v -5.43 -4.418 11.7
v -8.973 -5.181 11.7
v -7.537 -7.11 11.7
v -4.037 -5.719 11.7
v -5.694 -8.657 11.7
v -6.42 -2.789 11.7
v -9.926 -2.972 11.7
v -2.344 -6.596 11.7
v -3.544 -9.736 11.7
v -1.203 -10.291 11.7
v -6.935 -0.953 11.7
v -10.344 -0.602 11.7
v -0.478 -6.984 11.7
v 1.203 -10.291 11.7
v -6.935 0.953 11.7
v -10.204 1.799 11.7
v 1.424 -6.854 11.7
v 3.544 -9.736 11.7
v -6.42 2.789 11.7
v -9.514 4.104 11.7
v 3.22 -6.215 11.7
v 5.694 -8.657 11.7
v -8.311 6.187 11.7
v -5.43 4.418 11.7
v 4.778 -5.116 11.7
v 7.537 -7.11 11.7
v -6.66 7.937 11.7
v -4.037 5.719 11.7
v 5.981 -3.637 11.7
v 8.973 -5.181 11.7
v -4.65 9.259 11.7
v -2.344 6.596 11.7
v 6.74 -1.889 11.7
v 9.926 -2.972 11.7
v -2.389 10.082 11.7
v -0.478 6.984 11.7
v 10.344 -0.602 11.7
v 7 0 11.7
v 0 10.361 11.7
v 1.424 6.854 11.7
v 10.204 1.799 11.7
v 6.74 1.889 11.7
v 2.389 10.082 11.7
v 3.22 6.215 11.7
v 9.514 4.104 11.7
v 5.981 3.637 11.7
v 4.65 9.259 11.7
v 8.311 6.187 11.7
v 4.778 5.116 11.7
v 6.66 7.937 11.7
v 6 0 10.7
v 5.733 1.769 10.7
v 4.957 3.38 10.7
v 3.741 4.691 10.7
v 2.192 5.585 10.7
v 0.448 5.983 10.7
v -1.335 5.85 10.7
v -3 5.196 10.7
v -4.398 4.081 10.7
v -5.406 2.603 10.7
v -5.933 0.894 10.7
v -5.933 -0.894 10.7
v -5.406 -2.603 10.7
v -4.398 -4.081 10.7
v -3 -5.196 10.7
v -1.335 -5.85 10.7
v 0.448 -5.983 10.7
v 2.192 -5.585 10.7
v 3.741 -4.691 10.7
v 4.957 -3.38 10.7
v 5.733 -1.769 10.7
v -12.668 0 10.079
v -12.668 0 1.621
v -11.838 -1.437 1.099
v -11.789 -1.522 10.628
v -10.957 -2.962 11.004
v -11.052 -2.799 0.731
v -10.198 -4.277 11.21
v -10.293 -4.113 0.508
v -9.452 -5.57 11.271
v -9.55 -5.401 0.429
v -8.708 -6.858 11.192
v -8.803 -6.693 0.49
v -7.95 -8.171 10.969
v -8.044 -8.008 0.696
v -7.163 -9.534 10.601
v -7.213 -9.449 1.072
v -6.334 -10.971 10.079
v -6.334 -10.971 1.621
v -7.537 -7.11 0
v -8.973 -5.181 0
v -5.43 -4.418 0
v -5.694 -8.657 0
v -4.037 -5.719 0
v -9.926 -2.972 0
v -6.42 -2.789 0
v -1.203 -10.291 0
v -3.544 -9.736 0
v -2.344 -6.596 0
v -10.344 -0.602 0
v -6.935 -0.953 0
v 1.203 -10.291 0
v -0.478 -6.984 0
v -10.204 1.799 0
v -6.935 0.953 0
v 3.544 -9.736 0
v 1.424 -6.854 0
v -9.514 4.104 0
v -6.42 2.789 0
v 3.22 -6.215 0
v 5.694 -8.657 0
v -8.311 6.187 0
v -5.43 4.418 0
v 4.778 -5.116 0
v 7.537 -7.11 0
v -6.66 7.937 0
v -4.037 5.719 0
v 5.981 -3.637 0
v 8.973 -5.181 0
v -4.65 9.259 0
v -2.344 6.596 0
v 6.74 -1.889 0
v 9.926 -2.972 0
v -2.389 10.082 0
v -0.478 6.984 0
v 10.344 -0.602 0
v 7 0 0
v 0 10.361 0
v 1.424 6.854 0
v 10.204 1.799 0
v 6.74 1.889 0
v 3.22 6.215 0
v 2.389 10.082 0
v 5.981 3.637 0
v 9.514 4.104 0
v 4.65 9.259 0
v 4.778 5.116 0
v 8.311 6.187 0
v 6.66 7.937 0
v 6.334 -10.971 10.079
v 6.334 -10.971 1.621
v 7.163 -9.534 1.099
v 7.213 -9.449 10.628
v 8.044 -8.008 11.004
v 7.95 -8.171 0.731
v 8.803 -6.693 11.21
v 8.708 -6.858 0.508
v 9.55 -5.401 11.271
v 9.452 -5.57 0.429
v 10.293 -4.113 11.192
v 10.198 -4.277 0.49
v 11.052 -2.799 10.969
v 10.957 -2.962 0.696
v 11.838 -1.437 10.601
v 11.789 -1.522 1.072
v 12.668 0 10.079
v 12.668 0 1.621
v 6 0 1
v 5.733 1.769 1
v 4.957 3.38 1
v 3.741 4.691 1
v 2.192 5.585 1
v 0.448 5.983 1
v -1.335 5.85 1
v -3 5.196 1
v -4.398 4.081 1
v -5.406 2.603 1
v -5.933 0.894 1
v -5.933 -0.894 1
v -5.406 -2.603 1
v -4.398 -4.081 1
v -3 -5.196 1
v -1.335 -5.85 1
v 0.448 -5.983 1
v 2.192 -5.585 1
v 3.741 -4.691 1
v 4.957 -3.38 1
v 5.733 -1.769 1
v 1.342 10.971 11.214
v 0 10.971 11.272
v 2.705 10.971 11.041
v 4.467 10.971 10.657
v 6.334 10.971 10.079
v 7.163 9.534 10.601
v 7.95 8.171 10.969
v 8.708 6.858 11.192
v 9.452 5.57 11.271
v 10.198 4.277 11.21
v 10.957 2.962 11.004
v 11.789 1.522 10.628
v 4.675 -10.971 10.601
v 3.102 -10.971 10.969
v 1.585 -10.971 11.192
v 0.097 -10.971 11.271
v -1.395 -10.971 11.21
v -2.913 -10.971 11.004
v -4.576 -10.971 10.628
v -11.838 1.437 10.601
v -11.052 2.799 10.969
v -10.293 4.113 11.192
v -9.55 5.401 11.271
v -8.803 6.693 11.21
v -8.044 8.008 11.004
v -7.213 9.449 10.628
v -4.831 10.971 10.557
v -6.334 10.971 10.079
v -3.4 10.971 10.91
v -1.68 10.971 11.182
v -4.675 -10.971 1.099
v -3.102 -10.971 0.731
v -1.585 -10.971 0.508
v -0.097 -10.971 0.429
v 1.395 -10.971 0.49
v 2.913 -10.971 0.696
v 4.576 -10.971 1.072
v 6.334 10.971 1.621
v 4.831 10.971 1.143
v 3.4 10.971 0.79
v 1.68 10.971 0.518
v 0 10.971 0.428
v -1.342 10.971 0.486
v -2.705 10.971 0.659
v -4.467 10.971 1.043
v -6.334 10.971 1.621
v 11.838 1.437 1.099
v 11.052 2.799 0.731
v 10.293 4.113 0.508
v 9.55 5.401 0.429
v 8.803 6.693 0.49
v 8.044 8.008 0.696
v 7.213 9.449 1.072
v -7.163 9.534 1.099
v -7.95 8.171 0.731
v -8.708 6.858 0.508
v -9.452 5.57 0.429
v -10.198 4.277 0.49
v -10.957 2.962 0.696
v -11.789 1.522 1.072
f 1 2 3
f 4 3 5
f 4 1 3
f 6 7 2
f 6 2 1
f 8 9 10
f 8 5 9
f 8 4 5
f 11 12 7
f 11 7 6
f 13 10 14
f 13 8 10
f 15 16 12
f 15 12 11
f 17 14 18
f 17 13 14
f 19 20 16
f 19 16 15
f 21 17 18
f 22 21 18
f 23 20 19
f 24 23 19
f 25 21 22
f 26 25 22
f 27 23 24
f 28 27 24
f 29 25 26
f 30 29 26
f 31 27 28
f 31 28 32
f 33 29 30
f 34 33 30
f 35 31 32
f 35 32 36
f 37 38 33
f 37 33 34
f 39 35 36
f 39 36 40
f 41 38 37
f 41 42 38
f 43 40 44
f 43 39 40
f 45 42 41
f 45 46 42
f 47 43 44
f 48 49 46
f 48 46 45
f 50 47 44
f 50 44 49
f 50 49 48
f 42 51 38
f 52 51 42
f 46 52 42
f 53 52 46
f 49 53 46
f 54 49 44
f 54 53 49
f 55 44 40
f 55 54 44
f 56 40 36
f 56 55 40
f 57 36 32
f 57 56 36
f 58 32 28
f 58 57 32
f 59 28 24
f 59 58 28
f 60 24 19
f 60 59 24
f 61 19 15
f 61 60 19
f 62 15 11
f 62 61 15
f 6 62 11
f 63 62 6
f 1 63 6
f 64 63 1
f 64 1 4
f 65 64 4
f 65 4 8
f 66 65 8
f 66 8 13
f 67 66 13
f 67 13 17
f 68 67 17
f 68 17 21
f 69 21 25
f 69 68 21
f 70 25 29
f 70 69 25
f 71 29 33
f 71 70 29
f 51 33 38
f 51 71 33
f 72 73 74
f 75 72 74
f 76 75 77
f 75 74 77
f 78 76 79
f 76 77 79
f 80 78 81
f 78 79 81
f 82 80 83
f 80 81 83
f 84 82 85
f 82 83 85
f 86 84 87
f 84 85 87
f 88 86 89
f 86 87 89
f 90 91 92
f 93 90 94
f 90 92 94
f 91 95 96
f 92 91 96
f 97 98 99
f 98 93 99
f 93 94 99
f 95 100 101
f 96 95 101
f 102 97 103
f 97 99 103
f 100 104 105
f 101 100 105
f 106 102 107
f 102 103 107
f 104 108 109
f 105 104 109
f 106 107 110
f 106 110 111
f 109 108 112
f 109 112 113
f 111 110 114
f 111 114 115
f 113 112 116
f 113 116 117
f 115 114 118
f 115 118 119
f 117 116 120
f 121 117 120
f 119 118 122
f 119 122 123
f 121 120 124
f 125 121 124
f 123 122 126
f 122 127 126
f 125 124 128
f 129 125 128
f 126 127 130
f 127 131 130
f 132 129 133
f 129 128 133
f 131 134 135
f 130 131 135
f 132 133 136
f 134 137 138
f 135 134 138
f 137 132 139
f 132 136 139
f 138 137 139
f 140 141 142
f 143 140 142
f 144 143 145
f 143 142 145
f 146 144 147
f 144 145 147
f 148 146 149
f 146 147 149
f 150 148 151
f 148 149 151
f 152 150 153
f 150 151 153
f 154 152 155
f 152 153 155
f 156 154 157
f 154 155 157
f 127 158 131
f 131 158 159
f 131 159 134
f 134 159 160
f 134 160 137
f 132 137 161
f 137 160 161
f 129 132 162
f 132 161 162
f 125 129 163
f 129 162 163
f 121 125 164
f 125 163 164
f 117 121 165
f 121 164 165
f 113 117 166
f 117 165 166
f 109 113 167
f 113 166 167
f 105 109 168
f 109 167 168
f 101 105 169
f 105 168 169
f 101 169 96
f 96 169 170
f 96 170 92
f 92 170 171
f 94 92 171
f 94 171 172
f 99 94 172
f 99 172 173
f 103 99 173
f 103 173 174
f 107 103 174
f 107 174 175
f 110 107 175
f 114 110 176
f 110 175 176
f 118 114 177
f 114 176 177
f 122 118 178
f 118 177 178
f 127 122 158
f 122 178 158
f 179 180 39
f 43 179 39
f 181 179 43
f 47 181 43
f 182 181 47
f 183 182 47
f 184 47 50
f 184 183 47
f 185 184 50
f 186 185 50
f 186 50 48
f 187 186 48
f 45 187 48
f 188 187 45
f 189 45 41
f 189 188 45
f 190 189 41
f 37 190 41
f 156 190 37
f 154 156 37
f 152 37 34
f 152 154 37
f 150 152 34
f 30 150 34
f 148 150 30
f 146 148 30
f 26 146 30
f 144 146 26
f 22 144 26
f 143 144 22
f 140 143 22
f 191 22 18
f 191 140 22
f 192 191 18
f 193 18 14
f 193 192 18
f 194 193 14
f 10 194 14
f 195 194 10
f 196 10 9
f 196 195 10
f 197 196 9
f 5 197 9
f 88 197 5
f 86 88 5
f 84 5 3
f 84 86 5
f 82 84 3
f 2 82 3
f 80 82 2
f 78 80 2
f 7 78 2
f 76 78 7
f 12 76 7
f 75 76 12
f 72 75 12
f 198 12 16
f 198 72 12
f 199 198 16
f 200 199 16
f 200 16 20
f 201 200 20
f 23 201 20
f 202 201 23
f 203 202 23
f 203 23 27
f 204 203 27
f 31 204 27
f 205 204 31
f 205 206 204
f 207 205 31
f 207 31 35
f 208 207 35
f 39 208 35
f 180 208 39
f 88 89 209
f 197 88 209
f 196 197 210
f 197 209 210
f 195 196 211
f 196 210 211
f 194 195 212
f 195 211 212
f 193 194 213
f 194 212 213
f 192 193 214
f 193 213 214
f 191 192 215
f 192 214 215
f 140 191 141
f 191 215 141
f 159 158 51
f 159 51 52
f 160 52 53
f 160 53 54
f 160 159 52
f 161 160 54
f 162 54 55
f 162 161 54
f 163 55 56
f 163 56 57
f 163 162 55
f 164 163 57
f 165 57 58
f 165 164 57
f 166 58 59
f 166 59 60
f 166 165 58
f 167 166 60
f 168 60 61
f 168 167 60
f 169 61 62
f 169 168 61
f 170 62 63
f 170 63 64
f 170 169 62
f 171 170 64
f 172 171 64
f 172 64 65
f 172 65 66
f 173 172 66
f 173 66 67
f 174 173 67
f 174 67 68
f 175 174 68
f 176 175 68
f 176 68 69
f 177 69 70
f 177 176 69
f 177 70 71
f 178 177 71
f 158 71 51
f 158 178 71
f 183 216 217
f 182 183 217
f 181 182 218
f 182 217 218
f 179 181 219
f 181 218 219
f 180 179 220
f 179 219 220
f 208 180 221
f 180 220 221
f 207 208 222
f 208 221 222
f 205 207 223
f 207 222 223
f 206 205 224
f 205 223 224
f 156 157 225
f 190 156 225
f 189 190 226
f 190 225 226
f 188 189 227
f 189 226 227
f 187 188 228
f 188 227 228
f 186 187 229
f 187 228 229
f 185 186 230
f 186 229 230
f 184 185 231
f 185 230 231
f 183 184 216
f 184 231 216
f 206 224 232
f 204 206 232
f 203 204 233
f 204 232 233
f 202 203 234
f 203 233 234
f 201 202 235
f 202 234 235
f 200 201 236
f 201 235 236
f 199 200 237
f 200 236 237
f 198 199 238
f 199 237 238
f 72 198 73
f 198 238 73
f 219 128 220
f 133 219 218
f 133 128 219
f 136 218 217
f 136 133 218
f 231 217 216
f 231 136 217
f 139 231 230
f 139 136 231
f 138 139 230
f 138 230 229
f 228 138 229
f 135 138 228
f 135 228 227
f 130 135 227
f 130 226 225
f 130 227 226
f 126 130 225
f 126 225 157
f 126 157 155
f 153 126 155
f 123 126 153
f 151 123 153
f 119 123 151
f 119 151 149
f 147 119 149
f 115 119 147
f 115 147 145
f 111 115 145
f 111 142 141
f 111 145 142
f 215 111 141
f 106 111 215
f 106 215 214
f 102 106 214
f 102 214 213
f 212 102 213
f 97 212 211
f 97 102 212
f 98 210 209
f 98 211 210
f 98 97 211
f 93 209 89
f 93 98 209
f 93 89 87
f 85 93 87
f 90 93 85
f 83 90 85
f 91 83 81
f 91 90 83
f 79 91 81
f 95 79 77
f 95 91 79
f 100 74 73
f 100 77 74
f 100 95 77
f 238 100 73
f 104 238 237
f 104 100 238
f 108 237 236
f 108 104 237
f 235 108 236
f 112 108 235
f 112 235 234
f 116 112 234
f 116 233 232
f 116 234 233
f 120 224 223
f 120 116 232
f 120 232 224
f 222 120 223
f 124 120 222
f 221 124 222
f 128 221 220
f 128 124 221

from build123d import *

# Parameters (mm, degrees)
F0_R     = 6
F1_DEPTH = 11.7
F4_SIZE  = 1


with BuildPart() as f1:
    # F0 (on Top) → F1 (new body)
    with BuildSketch(Plane.XY):
        Polygon((6.333883, 10.970607), (-6.333883, 10.970607), (-12.667766, 0), (-6.333883, -10.970607), (6.333883, -10.970607), (12.667766, 0), align=None)
        Circle(F0_R, mode=Mode.SUBTRACT)
    extrude(amount=F1_DEPTH)

    # F2 (on Right) → F3 (revolve, cut)
    with BuildSketch(Plane.YZ):
        Polygon((13.277913, 12.61499), (9.648551, 12.201084), (13.277913, 9.649714), align=None)
        Polygon((13.277913, 2.050286), (9.648551, -0.501084), (13.277913, -0.91499), align=None)
    revolve(axis=Axis((0, 0, 5.981519), (0, 0, -1)), mode=Mode.SUBTRACT)

    # F4
    f4_edges = [f1.edges().sort_by_distance(p)[0] for p in [
        (-6, 0, 11.7),
        (-6, 0, 0),
    ]]
    chamfer(f4_edges, length=F4_SIZE)


solid = f1.part
